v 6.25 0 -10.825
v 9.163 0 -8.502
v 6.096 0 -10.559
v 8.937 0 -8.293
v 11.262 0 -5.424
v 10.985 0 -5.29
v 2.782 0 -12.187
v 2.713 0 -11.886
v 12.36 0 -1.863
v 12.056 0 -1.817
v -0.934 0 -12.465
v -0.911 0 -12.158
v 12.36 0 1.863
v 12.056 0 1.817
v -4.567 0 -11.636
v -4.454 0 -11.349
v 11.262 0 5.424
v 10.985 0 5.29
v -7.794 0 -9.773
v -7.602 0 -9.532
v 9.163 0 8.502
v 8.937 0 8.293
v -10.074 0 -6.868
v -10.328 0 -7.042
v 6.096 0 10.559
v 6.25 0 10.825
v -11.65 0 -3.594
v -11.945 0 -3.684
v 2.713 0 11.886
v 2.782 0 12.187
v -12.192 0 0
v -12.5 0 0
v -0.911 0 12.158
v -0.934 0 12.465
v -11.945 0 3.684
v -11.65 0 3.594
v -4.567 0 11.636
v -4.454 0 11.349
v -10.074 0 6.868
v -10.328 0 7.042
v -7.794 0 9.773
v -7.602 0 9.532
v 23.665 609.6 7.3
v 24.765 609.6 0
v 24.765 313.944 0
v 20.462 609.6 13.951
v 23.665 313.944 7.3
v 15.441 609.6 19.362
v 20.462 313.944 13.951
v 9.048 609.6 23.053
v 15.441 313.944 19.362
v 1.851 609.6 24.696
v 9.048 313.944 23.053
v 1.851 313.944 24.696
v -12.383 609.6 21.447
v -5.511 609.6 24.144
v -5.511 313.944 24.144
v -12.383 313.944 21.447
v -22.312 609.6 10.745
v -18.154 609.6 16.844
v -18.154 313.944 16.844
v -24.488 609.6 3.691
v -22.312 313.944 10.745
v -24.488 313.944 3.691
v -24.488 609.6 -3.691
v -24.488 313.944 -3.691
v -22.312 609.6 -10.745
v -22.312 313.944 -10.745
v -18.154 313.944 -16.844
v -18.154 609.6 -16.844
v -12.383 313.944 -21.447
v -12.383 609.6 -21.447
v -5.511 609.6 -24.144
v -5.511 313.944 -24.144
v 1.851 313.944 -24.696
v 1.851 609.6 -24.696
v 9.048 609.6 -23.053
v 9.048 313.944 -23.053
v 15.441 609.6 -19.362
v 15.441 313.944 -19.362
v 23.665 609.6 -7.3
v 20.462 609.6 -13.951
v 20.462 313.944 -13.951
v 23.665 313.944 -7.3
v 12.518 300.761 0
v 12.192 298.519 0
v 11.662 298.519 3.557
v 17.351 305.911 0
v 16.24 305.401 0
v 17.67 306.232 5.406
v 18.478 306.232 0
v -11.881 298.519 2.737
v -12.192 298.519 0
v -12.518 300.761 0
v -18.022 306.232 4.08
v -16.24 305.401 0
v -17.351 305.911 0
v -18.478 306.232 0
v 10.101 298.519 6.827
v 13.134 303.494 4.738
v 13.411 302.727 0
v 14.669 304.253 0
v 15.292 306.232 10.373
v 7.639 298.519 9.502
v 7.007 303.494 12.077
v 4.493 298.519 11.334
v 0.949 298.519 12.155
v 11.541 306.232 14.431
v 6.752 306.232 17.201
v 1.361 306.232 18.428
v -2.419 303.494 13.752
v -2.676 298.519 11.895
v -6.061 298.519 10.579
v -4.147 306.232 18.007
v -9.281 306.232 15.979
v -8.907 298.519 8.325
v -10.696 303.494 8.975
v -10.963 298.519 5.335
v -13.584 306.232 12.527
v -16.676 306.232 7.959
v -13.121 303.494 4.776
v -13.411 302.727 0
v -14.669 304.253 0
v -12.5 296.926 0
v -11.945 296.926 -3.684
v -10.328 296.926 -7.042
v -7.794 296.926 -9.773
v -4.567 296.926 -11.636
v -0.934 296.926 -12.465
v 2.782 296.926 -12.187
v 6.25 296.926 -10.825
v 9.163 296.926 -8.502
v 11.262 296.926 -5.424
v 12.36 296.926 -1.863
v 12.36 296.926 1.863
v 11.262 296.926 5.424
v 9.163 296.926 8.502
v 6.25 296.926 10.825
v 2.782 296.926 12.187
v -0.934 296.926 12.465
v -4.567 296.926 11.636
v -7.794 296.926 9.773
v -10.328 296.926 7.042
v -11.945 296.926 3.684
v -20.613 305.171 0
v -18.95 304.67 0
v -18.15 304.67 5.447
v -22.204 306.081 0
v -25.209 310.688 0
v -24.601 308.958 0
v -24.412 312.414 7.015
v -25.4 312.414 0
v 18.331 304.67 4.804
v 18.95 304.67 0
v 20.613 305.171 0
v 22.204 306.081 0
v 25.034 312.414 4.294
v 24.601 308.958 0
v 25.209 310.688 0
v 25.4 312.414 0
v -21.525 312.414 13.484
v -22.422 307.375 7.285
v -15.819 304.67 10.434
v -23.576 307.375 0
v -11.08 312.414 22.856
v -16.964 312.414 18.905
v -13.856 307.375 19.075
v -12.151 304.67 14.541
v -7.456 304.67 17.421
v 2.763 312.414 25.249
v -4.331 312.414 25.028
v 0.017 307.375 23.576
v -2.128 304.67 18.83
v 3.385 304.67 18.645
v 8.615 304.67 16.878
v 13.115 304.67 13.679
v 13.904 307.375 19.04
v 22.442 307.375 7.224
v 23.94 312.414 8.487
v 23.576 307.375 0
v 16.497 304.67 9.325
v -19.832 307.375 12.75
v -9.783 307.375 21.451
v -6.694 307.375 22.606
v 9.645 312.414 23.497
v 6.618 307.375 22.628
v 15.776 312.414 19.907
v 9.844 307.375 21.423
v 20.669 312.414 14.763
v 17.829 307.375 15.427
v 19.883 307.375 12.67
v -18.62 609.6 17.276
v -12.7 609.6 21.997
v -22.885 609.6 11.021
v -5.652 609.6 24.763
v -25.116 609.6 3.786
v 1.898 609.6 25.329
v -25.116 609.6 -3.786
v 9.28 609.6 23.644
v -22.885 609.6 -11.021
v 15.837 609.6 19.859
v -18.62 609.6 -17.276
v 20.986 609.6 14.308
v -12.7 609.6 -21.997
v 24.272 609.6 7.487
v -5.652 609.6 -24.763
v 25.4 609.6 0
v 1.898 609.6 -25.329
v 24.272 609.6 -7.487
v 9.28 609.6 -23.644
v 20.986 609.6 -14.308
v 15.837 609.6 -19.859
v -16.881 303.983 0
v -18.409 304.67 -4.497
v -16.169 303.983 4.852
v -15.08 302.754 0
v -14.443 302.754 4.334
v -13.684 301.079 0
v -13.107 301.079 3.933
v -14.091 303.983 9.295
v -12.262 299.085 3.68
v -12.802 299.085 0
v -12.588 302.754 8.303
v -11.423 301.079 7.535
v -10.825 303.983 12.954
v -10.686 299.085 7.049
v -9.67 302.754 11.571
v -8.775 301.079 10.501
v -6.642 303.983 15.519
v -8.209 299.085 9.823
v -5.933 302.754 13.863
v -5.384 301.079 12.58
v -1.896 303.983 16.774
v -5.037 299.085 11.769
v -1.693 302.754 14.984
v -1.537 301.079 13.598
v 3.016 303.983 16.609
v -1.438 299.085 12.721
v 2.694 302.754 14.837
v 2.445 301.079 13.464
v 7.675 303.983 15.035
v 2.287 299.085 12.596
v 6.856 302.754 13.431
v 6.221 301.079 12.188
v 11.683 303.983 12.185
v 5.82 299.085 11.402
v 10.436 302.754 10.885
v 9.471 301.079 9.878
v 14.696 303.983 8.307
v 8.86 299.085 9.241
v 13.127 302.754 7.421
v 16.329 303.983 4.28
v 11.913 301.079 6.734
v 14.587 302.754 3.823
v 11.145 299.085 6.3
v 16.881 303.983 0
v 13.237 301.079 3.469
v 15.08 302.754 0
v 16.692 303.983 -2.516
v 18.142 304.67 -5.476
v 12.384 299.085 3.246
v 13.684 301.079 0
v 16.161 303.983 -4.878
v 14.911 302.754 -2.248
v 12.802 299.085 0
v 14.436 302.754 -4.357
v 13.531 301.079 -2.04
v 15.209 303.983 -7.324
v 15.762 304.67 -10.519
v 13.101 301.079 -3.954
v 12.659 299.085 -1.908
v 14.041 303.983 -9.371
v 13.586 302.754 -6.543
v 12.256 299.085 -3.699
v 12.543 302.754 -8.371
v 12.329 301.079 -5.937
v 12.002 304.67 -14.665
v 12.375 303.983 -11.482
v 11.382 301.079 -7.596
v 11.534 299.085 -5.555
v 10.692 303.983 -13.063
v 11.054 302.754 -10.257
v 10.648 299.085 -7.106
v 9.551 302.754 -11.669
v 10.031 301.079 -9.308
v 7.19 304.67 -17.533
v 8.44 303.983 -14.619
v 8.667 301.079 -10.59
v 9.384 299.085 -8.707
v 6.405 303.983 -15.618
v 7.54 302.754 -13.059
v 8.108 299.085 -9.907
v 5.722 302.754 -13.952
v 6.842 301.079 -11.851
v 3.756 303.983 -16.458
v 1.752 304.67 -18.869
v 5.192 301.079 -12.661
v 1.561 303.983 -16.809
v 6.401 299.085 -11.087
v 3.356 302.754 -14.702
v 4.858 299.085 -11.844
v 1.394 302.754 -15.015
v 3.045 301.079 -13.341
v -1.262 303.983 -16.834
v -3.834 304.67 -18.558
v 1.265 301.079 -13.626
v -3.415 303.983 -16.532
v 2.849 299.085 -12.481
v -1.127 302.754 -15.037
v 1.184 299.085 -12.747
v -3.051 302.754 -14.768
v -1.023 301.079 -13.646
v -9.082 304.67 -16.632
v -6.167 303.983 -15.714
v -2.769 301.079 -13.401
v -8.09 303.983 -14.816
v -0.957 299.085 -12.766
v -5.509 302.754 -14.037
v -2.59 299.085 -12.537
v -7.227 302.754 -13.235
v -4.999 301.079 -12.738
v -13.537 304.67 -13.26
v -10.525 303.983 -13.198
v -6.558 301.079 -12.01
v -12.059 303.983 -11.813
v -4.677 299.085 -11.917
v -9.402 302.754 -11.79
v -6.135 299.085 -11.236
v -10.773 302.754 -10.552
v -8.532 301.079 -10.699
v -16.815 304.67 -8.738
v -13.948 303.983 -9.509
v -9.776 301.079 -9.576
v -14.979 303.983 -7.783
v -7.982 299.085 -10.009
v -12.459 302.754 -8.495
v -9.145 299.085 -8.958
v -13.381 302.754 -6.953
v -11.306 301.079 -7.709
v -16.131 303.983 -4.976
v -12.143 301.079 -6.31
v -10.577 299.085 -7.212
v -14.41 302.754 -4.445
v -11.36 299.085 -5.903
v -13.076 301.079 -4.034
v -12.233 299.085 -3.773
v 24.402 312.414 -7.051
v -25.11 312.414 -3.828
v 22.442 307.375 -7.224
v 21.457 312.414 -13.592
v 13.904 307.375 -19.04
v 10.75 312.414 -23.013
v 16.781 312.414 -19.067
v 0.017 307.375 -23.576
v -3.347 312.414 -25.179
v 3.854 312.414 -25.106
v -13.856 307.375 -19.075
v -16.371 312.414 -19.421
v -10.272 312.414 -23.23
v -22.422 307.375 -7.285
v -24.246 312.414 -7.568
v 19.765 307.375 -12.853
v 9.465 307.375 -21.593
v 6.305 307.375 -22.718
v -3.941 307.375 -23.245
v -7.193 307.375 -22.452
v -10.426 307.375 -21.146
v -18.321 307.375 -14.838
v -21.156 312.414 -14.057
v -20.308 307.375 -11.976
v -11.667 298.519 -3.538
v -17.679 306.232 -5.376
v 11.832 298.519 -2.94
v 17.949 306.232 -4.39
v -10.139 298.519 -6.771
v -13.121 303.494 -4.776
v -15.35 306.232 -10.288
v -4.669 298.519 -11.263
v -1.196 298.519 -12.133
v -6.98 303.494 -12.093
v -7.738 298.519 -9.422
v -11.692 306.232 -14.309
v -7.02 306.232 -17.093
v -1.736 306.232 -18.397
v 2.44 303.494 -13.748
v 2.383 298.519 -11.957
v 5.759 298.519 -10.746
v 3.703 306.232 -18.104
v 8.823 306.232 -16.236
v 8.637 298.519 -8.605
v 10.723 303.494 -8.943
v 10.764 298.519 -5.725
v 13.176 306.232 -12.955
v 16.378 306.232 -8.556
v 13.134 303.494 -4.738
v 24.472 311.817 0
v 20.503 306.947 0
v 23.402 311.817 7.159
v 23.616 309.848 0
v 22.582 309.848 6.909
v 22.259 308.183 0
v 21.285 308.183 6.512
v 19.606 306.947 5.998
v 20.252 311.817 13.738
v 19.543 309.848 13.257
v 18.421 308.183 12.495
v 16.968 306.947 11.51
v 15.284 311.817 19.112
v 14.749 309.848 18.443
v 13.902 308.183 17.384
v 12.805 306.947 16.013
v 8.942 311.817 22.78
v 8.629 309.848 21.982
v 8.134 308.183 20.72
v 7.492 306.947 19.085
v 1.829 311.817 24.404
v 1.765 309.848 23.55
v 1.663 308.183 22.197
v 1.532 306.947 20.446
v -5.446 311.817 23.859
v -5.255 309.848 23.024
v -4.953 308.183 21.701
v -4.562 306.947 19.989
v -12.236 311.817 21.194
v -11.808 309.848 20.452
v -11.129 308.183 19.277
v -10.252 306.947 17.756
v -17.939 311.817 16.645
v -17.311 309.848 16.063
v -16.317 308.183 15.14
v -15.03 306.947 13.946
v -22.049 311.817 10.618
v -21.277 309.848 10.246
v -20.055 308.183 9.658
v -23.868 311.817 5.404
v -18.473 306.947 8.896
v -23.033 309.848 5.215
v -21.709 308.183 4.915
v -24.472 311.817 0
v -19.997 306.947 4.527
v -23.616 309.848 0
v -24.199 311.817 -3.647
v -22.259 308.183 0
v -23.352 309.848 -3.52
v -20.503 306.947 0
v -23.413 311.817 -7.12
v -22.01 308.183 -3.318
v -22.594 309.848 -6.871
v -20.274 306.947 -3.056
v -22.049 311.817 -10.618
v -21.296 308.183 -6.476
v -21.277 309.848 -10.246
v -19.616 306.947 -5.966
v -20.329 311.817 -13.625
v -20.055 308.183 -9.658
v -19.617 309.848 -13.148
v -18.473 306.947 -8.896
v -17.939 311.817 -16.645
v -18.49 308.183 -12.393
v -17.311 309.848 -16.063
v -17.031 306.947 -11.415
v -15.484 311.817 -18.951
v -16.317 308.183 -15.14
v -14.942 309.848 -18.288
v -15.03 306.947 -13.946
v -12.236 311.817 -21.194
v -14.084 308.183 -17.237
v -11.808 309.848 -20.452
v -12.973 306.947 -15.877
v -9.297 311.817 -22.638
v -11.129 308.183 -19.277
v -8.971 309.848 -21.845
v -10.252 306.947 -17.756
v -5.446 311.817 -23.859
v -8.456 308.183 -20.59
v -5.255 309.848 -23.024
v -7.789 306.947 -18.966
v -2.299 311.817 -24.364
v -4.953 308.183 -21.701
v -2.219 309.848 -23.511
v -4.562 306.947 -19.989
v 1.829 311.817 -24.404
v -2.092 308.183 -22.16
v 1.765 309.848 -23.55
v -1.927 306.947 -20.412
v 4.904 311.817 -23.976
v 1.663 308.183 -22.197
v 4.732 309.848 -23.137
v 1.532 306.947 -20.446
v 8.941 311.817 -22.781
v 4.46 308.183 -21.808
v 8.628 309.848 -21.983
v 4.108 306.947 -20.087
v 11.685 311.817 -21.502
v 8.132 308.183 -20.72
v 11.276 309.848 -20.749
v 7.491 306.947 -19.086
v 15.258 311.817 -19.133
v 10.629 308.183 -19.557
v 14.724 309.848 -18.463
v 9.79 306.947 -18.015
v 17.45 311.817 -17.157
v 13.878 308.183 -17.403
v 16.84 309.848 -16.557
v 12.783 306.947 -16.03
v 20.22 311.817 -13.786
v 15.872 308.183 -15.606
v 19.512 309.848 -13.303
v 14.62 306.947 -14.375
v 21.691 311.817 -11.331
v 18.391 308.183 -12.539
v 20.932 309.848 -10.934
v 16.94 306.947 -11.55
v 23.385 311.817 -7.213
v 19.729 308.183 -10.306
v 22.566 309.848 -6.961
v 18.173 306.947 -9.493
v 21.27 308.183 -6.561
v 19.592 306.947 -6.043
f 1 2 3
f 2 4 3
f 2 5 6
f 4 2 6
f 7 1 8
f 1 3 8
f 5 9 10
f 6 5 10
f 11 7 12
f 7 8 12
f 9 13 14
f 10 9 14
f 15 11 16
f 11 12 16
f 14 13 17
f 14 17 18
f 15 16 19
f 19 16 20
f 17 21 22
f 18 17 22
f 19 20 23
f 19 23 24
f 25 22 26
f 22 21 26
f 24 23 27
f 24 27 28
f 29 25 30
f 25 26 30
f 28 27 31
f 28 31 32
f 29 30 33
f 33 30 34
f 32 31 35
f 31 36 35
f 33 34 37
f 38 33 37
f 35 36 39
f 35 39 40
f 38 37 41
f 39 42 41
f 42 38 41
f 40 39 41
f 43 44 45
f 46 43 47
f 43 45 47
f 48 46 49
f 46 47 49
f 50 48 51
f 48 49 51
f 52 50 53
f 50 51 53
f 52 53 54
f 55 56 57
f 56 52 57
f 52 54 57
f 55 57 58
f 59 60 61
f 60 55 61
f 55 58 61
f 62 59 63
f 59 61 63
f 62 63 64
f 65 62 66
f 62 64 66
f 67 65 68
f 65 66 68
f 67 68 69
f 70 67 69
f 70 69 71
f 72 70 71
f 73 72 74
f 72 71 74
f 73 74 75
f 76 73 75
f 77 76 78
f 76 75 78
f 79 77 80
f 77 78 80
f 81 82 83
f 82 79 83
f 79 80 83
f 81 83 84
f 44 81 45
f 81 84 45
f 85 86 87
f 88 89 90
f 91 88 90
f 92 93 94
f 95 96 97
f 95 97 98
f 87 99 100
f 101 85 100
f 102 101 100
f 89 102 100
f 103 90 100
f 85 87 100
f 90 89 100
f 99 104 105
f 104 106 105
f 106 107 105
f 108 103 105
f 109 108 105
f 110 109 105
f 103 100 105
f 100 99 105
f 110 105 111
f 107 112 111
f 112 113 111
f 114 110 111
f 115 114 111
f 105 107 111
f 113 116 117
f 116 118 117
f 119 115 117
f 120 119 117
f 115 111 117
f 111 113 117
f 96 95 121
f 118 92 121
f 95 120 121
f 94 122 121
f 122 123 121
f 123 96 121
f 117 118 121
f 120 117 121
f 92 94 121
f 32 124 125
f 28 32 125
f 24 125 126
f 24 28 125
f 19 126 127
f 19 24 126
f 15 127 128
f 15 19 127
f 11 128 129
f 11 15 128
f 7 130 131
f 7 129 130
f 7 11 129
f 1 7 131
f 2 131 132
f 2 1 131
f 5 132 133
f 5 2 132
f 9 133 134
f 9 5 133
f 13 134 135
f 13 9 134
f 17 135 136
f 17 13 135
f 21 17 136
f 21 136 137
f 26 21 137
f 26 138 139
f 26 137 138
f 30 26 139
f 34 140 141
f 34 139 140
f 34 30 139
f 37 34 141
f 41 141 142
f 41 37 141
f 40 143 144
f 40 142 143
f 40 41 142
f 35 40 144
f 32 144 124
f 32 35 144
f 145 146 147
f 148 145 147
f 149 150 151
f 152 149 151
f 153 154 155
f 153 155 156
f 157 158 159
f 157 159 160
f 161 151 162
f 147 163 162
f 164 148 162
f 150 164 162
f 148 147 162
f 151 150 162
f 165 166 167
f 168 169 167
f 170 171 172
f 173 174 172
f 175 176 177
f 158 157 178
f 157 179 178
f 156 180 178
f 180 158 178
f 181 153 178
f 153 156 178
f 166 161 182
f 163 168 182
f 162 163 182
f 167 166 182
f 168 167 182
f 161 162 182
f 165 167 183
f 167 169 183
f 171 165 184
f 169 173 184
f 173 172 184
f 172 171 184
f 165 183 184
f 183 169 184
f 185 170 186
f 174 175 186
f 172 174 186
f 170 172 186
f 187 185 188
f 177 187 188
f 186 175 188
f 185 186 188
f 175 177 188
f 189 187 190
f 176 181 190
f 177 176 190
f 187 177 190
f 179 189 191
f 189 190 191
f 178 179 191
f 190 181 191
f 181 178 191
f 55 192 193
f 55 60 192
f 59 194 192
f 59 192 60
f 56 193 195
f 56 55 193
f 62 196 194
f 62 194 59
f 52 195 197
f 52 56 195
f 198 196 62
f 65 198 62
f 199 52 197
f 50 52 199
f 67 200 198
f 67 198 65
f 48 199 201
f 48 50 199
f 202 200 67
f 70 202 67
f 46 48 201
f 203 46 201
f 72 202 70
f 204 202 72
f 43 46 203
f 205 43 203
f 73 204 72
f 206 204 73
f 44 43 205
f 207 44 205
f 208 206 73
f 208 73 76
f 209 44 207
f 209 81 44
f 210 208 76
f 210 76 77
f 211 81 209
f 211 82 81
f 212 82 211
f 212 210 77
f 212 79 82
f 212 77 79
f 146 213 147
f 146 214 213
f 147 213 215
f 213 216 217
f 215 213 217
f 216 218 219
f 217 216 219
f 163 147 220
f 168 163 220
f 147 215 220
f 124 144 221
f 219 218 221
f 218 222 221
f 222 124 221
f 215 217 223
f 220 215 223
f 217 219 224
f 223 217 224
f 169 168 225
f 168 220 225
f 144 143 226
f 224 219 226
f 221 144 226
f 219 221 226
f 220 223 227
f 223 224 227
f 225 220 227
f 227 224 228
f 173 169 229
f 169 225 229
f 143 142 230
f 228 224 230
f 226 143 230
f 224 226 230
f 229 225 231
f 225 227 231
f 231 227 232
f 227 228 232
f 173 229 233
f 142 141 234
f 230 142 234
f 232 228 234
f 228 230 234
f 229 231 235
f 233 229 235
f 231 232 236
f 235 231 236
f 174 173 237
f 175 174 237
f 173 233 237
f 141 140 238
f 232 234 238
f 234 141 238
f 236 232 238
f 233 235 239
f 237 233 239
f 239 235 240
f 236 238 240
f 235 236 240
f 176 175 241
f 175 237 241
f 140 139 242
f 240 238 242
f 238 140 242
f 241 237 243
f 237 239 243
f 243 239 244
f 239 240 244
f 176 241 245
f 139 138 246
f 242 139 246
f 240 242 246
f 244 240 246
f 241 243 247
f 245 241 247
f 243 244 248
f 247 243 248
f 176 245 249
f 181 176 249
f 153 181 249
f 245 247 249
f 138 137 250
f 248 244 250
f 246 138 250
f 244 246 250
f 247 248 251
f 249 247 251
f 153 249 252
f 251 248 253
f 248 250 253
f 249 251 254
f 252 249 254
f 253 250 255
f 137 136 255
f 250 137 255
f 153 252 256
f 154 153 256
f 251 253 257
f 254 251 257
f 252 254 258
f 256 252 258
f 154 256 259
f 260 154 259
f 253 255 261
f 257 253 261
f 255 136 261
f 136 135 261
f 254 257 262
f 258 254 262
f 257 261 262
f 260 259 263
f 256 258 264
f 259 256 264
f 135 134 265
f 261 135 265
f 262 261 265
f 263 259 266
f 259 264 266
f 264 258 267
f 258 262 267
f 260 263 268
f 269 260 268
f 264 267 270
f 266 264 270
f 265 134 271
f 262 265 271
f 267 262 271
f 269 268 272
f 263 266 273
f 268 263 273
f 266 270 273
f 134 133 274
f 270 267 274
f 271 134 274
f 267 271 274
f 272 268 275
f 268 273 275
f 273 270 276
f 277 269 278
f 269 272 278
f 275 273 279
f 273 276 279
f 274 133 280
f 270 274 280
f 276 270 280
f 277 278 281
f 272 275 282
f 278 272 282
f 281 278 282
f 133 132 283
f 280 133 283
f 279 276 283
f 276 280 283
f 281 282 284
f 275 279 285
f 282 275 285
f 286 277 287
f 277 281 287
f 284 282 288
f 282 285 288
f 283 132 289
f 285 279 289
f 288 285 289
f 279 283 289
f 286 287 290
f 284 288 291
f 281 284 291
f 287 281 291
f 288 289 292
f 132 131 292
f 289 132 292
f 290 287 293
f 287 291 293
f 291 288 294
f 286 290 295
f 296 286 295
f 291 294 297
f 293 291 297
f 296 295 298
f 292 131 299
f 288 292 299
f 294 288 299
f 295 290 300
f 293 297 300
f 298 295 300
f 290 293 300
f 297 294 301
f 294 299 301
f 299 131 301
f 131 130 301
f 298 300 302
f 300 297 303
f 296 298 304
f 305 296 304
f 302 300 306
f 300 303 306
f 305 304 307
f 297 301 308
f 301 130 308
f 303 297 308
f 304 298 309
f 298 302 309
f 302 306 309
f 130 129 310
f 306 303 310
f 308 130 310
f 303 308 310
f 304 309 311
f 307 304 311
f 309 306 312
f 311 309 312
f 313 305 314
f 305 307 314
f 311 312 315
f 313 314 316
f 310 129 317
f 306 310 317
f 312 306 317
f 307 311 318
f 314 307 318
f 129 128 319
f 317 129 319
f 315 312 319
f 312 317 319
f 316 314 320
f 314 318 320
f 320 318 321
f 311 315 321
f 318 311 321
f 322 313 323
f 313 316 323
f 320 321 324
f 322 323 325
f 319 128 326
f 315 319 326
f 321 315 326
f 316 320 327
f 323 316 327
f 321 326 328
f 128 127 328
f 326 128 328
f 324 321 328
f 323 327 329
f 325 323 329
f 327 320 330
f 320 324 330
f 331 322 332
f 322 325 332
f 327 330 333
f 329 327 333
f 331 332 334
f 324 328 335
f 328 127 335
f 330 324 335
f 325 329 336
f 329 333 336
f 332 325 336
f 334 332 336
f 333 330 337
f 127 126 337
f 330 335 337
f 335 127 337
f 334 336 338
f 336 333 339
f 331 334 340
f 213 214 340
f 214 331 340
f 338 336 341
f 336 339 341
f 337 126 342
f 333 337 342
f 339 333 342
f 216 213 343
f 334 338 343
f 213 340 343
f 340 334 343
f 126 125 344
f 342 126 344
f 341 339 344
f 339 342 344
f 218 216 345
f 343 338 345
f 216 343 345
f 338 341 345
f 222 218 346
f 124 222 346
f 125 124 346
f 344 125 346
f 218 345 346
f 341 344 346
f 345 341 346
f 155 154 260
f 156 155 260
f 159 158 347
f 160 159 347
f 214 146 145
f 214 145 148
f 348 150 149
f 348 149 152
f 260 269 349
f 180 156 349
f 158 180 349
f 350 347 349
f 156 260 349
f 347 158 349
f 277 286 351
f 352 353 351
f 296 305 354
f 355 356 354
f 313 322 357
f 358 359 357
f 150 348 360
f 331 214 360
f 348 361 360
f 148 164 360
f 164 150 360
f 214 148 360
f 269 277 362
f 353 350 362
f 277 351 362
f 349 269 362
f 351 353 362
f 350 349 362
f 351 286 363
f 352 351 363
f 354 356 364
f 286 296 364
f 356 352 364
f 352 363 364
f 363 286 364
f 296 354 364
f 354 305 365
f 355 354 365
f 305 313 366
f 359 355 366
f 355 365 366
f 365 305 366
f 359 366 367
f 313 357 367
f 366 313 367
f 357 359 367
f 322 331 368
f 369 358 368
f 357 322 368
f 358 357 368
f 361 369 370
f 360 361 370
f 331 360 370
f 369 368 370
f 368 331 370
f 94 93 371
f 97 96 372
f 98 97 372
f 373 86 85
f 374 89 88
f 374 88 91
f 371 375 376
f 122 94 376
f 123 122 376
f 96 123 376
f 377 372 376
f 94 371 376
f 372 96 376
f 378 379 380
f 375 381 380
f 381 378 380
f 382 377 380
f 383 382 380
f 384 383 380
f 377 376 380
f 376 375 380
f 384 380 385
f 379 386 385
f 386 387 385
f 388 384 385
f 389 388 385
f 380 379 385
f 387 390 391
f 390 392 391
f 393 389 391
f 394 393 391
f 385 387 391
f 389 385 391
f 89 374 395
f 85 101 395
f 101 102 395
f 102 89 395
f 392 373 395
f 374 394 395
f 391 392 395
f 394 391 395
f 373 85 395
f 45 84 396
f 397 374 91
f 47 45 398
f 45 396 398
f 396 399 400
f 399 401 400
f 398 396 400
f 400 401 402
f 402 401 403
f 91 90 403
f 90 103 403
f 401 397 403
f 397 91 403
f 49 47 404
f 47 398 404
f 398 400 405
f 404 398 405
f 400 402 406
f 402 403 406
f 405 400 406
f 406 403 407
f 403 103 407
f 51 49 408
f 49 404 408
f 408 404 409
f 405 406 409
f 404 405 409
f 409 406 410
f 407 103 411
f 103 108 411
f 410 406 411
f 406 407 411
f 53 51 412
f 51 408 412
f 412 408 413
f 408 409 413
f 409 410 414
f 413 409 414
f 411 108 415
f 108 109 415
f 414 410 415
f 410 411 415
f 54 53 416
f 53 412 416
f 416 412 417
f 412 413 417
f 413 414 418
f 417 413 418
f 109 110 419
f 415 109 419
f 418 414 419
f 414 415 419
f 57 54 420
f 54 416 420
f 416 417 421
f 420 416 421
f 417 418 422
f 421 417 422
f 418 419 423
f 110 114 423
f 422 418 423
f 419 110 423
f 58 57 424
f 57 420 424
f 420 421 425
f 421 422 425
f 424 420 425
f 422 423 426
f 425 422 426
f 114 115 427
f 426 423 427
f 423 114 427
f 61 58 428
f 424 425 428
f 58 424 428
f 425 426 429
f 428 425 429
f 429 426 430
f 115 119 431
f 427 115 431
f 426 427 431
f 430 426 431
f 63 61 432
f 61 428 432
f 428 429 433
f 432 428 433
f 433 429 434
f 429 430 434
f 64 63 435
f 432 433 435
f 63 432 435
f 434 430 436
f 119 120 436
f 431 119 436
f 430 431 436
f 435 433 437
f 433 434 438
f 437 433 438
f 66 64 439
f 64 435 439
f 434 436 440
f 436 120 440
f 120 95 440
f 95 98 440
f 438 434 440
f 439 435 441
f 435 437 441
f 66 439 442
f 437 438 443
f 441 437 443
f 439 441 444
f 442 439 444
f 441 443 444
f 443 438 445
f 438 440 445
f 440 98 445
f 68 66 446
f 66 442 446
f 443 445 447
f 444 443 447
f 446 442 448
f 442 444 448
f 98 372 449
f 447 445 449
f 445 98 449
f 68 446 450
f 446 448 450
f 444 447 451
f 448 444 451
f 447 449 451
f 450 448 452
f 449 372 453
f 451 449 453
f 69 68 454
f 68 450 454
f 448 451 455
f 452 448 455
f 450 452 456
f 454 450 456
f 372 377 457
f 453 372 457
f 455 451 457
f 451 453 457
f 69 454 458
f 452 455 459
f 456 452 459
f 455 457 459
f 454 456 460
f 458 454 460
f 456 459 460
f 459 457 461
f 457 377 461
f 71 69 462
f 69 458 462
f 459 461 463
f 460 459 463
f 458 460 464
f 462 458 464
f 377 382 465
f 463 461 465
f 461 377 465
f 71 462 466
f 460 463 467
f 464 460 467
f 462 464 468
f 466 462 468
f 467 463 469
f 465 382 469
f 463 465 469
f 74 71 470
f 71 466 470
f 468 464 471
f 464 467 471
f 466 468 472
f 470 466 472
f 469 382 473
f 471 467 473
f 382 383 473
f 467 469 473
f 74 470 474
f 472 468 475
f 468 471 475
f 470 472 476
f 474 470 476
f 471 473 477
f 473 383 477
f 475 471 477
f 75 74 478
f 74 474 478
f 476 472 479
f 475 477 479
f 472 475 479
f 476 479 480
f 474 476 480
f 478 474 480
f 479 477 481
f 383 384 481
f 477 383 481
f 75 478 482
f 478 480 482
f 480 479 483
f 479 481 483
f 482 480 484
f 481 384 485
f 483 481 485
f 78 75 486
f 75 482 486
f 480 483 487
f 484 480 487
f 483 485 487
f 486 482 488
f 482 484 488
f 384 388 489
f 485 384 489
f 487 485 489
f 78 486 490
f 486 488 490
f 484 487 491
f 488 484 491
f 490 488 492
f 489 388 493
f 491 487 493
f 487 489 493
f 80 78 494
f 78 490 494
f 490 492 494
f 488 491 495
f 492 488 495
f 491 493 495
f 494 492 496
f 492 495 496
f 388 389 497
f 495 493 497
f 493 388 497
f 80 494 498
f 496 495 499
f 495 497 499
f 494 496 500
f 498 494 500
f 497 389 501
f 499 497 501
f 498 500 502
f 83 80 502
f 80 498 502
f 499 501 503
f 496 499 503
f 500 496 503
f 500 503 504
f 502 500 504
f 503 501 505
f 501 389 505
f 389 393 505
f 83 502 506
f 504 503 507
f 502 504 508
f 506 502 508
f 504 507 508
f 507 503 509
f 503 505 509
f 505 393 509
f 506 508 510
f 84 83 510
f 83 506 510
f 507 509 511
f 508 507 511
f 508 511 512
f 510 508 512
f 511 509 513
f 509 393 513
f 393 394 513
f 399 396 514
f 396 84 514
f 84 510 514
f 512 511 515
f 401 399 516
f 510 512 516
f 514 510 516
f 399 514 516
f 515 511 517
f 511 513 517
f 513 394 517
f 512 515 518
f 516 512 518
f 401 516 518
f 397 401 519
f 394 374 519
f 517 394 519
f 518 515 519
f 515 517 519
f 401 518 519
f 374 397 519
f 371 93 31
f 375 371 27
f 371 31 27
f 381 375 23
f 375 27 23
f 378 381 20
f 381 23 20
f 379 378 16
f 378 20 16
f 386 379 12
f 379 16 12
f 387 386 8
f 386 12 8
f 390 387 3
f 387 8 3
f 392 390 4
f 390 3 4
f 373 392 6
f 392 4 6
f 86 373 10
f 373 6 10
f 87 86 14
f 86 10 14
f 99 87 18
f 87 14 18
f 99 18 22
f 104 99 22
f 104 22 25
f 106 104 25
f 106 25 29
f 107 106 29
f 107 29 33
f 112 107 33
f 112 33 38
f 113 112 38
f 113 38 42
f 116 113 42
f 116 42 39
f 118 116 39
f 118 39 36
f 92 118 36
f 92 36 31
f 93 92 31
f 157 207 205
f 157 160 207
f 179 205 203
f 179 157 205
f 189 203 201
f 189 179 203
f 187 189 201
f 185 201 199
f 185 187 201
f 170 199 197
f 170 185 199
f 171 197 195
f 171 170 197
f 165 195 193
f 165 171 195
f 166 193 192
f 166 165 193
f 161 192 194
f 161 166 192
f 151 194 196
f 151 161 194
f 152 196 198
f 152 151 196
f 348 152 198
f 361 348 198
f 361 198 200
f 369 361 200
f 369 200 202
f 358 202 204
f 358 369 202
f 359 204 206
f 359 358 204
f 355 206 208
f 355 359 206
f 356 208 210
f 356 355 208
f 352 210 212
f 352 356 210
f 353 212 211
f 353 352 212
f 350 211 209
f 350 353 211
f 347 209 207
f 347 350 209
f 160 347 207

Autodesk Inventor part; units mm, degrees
ref_plane "YZ Plane" through (0, 0, 0) normal (1, 0, 0) x (0, 1, 0)
ref_plane "XZ Plane" through (0, 0, 0) normal (0, 1, 0) x (-1, 0, 0)
ref_plane "XY Plane" through (0, 0, 0) normal (0, 0, 1) x (1, 0, 0)
sketch "Sketch1" plane through (0, 0, 0) normal (0, 1, 0) x (-1, 0, 0)
  circle A0 centre (0, 0) radius 12.5
  circle A1 centre (0, 0) radius 12.192
  dimension "d0" = 25
  dimension "d1" = 24.384
extrude "Extrusion1" add sketch "Sketch1" along normal blind 304.8
sketch "Sketch2" plane through (0, 304.8, 0) normal (0, 1, 0) x (1, 0, 0)
  circle A0 centre (0, 0) radius 24.765
  circle A1 centre (0, 0) radius 25.4
  dimension "d4" = 50.8
  dimension "d5" = 49.53
extrude "Extrusion2" add sketch "Sketch2" along normal blind 304.8
sketch "Sketch3" plane through (0, 304.8, 0) normal (0, -1, 0) x (1, 0, 0)
  circle A0 centre (0, 0) radius 25.4
  circle A1 centre (0, 0) radius 12.192
  dimension "d8" = 50.8
  dimension "d12" = 24.384
extrude "Extrusion3" add sketch "Sketch3" against normal blind 1.27
fillet "Fillet1" radius 7.874 3 edges at (12.5, 304.8, 0) (-24.765, 306.07, 0) (-25.4, 304.8, 0)
fillet "Fillet2" radius 7.874 1 edges at (-12.192, 306.07, 0)
properties part number "still pipe standin" material "Stainless Steel, Austenitic"
